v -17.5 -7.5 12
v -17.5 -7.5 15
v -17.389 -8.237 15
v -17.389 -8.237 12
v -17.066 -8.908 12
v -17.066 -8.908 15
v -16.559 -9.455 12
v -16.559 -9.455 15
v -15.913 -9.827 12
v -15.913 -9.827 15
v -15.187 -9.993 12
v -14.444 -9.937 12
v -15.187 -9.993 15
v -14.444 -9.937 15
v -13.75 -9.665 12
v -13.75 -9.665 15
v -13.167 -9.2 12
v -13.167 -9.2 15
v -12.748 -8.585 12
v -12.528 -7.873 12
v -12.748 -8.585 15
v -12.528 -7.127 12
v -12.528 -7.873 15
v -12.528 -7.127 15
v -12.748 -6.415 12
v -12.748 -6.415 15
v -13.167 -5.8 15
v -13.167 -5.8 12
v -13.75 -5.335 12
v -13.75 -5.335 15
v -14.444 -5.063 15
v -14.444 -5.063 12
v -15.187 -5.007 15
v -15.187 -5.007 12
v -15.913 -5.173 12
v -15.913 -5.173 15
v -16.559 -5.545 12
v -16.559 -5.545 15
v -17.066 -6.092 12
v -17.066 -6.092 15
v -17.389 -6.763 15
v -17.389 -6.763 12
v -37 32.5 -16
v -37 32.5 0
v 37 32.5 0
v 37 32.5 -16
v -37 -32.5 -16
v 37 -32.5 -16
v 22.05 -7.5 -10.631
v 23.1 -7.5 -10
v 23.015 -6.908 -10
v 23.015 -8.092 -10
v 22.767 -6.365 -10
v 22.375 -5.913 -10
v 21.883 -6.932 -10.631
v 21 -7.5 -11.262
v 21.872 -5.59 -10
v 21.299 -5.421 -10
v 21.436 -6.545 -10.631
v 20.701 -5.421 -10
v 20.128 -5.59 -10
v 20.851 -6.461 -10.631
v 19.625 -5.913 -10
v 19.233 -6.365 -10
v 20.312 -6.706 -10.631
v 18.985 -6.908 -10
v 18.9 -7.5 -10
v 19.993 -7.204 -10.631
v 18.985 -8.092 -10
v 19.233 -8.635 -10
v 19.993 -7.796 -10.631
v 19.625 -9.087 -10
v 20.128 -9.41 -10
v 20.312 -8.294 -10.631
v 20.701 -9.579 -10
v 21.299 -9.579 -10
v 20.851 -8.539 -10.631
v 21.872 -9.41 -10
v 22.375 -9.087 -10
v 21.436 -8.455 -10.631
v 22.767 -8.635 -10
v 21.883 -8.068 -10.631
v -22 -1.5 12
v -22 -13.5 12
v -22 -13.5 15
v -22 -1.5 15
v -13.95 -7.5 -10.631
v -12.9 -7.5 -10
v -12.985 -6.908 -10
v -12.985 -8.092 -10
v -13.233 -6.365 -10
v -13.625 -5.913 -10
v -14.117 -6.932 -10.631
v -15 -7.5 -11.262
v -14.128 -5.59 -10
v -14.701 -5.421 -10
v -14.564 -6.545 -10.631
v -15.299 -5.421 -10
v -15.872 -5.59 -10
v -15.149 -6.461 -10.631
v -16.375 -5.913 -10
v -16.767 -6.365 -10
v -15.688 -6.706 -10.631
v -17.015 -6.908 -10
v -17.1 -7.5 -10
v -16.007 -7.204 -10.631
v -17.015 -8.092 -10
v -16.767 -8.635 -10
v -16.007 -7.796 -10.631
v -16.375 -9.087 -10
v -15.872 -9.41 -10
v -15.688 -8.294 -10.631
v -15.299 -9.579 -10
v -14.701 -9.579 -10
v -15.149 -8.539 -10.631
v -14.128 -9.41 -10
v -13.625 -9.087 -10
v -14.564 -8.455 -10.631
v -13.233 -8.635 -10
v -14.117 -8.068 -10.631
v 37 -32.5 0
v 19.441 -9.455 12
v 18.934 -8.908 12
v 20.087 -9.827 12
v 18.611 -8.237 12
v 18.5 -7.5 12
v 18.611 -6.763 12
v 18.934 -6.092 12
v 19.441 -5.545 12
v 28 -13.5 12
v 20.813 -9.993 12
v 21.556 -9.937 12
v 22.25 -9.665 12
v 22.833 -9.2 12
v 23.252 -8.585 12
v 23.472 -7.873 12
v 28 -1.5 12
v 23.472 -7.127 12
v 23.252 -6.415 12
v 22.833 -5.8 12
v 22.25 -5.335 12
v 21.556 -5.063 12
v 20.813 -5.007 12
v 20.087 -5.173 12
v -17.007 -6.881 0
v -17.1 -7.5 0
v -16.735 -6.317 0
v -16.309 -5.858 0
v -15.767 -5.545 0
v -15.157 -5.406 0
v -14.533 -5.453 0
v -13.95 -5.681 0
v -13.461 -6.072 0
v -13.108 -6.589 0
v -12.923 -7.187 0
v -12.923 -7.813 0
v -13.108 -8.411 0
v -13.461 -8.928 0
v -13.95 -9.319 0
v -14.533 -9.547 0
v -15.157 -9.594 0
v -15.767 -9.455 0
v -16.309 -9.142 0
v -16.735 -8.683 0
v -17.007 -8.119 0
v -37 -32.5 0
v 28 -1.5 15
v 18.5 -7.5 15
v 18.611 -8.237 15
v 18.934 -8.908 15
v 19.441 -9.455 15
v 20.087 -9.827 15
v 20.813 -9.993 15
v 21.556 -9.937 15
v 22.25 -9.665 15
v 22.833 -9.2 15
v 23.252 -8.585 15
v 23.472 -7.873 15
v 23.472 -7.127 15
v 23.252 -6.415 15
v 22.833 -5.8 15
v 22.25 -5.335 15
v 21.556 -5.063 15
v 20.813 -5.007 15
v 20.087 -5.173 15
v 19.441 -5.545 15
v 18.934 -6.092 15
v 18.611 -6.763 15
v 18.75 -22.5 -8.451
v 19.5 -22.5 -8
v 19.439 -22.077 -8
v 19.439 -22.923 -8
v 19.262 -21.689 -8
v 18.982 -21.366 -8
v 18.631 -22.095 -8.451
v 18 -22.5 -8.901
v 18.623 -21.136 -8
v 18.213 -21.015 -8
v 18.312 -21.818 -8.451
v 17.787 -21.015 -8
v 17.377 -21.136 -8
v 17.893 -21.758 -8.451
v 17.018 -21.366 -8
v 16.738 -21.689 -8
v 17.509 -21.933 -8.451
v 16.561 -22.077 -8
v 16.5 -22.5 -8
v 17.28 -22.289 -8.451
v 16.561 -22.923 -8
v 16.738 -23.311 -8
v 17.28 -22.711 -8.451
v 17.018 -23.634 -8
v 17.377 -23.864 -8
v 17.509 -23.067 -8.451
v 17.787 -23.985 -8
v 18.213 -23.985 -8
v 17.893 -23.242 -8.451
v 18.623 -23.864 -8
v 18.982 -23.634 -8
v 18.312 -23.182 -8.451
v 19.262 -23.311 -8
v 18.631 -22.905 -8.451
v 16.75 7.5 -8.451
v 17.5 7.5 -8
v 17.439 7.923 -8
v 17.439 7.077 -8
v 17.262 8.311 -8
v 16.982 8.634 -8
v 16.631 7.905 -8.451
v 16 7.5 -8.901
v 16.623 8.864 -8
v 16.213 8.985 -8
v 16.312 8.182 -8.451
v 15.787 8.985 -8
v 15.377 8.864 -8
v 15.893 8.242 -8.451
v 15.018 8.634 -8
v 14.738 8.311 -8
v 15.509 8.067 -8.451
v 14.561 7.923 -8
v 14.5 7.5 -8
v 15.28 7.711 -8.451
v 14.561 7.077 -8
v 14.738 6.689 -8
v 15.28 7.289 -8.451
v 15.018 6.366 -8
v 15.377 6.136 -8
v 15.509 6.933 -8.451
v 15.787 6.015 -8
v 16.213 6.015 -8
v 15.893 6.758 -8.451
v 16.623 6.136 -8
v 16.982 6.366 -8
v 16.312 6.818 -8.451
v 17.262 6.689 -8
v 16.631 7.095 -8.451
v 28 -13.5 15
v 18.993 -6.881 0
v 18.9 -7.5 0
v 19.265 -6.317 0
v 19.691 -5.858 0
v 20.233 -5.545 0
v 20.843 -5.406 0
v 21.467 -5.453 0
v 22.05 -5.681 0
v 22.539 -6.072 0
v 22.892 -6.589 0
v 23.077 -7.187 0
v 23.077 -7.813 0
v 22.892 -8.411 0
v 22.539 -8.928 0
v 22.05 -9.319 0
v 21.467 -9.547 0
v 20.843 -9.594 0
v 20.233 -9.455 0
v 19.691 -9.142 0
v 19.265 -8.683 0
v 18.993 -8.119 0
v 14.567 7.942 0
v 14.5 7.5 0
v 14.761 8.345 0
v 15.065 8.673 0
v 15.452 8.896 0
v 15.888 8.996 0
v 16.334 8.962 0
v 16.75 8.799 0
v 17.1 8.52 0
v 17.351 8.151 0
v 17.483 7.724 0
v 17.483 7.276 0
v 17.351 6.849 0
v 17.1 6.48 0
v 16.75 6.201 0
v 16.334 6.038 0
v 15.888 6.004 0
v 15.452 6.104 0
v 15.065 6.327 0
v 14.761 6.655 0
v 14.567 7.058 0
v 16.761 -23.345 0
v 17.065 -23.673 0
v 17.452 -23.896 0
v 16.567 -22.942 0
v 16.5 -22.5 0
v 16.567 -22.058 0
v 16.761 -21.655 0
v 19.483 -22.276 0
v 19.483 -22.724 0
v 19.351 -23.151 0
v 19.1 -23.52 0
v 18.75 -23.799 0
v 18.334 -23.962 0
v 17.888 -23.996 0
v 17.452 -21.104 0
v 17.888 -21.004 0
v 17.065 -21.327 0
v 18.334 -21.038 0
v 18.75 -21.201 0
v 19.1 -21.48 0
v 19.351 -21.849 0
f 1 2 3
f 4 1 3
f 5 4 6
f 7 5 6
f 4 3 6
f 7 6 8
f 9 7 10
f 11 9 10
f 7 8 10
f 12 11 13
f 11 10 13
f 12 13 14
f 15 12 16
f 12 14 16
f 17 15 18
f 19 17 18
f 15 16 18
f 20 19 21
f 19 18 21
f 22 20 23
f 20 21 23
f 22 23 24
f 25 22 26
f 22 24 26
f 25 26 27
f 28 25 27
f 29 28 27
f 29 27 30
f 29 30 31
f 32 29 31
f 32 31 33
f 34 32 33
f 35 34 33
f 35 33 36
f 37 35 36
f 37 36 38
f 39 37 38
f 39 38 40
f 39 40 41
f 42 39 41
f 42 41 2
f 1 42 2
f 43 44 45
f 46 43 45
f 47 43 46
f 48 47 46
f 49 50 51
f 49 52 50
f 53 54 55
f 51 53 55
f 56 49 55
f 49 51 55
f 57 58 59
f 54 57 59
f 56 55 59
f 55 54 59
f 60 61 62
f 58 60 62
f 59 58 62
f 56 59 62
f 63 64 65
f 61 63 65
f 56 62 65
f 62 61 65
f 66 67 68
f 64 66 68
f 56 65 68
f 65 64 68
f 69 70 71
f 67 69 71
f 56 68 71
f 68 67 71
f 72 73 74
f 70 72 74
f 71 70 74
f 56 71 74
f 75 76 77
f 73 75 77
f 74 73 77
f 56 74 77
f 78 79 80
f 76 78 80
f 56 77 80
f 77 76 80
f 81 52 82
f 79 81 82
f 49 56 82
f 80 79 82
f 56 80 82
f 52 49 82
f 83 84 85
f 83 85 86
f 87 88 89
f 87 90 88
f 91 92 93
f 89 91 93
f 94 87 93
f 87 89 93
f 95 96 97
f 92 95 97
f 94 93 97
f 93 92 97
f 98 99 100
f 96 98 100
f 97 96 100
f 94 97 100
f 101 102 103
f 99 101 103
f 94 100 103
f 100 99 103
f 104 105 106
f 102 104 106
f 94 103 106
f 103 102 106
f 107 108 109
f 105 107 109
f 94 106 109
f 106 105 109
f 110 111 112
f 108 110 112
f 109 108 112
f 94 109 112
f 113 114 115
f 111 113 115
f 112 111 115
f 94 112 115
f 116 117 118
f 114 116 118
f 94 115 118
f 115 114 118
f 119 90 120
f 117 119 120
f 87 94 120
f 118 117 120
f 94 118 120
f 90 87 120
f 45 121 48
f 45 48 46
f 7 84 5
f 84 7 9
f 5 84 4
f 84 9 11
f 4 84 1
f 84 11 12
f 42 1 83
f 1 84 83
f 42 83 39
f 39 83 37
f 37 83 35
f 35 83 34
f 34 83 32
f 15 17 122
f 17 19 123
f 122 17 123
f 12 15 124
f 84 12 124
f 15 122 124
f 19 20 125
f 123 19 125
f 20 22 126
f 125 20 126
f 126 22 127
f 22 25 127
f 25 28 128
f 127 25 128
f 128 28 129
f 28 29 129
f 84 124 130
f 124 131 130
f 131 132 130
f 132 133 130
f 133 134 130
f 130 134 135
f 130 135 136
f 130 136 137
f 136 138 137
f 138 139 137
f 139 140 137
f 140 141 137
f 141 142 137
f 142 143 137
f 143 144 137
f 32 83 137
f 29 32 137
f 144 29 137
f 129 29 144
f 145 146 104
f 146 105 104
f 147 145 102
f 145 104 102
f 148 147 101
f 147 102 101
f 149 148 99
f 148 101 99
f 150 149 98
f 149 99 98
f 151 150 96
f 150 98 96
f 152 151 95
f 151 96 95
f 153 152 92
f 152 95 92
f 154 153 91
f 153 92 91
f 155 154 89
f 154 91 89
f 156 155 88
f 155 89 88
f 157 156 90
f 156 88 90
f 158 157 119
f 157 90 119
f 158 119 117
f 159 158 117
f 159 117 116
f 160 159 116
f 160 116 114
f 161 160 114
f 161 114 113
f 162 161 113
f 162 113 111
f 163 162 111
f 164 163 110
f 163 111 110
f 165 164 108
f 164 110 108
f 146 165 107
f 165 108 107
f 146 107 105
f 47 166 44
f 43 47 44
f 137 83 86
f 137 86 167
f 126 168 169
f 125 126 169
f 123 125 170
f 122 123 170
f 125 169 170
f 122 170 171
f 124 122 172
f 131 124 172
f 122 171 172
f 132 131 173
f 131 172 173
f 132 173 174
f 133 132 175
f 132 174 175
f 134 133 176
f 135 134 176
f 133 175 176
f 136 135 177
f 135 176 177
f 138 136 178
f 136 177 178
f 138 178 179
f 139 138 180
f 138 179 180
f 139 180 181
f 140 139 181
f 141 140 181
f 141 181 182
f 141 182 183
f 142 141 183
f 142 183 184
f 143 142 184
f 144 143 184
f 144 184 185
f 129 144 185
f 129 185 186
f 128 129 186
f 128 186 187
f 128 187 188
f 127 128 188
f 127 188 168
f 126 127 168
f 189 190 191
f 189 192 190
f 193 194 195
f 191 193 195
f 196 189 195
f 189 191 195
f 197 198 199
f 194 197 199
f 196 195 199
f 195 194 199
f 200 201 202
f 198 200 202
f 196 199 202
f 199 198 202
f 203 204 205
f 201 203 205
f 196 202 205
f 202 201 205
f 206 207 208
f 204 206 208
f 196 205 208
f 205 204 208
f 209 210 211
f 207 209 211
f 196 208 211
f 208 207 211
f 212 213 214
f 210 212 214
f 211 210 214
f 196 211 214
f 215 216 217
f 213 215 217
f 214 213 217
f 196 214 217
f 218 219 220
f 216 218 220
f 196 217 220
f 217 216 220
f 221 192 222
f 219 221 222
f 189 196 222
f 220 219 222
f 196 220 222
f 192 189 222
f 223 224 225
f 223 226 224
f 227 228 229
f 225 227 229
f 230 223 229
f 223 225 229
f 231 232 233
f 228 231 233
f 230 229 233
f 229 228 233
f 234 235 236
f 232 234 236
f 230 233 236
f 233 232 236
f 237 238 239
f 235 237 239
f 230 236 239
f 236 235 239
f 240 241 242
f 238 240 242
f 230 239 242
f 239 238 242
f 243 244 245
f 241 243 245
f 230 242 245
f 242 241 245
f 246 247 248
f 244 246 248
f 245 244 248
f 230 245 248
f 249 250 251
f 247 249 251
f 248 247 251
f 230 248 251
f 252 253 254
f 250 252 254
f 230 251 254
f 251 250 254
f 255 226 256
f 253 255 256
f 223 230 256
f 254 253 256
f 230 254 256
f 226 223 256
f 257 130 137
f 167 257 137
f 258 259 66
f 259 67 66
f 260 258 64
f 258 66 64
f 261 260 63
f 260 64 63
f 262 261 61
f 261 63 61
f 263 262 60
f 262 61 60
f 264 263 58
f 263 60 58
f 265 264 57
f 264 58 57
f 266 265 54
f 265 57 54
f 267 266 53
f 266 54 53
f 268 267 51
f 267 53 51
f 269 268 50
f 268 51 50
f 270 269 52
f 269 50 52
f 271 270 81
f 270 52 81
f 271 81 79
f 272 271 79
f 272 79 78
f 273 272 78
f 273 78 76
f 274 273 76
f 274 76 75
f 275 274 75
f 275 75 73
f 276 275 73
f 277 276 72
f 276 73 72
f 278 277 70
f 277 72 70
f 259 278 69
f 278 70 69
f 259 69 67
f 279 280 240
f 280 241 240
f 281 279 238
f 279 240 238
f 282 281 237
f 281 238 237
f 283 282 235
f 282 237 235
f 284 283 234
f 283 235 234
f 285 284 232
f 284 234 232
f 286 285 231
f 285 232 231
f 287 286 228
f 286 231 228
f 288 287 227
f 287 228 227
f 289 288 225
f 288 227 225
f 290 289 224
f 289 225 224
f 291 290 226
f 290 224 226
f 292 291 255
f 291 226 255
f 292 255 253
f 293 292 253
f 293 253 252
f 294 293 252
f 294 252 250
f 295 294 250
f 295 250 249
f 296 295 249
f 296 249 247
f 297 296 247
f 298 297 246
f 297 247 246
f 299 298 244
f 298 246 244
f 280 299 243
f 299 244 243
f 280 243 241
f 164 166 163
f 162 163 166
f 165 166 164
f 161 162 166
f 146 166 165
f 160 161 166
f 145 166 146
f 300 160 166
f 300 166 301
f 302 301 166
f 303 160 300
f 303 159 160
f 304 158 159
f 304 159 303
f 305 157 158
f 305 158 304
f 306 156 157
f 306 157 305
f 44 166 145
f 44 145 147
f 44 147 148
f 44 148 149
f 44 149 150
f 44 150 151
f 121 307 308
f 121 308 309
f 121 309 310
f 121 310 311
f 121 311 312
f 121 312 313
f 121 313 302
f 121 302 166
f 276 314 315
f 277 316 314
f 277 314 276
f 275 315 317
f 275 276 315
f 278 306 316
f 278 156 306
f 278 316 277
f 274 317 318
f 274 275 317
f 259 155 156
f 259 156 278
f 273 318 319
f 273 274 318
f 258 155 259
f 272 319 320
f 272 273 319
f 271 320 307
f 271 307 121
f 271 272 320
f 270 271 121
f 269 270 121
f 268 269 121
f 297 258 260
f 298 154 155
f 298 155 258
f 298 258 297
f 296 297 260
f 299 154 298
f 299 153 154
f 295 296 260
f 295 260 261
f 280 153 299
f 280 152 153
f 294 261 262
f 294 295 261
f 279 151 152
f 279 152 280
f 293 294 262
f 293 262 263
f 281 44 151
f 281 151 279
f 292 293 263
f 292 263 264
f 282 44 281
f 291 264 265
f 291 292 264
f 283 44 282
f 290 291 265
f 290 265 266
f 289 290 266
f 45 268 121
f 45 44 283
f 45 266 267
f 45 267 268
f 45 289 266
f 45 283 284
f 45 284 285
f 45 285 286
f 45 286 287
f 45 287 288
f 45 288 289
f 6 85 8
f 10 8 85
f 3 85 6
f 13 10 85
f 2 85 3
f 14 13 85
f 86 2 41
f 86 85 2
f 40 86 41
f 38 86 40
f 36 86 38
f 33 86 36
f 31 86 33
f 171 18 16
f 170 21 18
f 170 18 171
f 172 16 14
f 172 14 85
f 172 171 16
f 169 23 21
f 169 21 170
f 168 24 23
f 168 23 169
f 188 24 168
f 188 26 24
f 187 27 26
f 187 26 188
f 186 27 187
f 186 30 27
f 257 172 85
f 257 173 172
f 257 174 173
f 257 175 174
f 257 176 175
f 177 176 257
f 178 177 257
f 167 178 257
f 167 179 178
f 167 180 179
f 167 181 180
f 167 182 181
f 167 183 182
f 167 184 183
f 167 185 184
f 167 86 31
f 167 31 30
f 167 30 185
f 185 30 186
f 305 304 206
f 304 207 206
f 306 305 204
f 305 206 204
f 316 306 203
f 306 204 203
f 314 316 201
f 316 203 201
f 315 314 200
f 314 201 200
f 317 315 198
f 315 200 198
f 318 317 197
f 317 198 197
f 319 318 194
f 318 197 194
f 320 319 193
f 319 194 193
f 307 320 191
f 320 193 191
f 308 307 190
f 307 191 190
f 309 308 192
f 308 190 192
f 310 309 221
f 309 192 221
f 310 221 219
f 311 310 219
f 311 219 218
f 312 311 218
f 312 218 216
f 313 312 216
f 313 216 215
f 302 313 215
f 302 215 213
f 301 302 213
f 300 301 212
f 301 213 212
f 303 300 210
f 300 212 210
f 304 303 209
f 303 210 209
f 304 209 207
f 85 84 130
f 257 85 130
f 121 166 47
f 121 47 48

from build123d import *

# Parameters (mm, degrees)
F0_W     = 74
F0_H     = 65
F1_DEPTH = 16
F3_D     = 3
F3_DEPTH = 8
F3_TIP   = 0.9012909285
F4_D     = 4.2
F4_DEPTH = 10
F4_TIP   = 1.2618073
F7_W     = 50
F7_H     = 12
F8_DEPTH = 3
F9_D     = 5
F9_DEPTH = 8
F9_TIP   = 1.5021515476


with BuildPart() as f1:
    # F0 (on Top) → F1 (new body)
    with BuildSketch(Plane.XY):
        Rectangle(F0_W, F0_H)
    extrude(amount=-F1_DEPTH)

    # F3
    with Locations(Plane.XY):
        with Locations((18, -22.5), (16, 7.5)):
            Hole(F3_D / 2, depth=F3_DEPTH)
            with Locations((0, 0, -(F3_DEPTH + F3_TIP / 2))):  # 118° drill point
                Cone(0, F3_D / 2, F3_TIP, mode=Mode.SUBTRACT)

    # F4
    with Locations(Plane.XY):
        with Locations((21, -7.5), (-15, -7.5)):
            Hole(F4_D / 2, depth=F4_DEPTH)
            with Locations((0, 0, -(F4_DEPTH + F4_TIP / 2))):  # 118° drill point
                Cone(0, F4_D / 2, F4_TIP, mode=Mode.SUBTRACT)


with BuildPart() as f8:
    # F7 (on offset) → F8 (new body)
    with BuildSketch(Plane.XY.offset(12)):
        with Locations((3, -7.5)):
            Rectangle(F7_W, F7_H)
    extrude(amount=F8_DEPTH)

    # F9
    with Locations(Plane(origin=(0, 0, 12), x_dir=(1, 0, 0), z_dir=(0, 0, -1))):
        with Locations((-15, 7.5), (21, 7.5)):
            Hole(F9_D / 2, depth=F9_DEPTH)
            with Locations((0, 0, -(F9_DEPTH + F9_TIP / 2))):  # 118° drill point
                Cone(0, F9_D / 2, F9_TIP, mode=Mode.SUBTRACT)


solid = Compound([f1.part, f8.part])
